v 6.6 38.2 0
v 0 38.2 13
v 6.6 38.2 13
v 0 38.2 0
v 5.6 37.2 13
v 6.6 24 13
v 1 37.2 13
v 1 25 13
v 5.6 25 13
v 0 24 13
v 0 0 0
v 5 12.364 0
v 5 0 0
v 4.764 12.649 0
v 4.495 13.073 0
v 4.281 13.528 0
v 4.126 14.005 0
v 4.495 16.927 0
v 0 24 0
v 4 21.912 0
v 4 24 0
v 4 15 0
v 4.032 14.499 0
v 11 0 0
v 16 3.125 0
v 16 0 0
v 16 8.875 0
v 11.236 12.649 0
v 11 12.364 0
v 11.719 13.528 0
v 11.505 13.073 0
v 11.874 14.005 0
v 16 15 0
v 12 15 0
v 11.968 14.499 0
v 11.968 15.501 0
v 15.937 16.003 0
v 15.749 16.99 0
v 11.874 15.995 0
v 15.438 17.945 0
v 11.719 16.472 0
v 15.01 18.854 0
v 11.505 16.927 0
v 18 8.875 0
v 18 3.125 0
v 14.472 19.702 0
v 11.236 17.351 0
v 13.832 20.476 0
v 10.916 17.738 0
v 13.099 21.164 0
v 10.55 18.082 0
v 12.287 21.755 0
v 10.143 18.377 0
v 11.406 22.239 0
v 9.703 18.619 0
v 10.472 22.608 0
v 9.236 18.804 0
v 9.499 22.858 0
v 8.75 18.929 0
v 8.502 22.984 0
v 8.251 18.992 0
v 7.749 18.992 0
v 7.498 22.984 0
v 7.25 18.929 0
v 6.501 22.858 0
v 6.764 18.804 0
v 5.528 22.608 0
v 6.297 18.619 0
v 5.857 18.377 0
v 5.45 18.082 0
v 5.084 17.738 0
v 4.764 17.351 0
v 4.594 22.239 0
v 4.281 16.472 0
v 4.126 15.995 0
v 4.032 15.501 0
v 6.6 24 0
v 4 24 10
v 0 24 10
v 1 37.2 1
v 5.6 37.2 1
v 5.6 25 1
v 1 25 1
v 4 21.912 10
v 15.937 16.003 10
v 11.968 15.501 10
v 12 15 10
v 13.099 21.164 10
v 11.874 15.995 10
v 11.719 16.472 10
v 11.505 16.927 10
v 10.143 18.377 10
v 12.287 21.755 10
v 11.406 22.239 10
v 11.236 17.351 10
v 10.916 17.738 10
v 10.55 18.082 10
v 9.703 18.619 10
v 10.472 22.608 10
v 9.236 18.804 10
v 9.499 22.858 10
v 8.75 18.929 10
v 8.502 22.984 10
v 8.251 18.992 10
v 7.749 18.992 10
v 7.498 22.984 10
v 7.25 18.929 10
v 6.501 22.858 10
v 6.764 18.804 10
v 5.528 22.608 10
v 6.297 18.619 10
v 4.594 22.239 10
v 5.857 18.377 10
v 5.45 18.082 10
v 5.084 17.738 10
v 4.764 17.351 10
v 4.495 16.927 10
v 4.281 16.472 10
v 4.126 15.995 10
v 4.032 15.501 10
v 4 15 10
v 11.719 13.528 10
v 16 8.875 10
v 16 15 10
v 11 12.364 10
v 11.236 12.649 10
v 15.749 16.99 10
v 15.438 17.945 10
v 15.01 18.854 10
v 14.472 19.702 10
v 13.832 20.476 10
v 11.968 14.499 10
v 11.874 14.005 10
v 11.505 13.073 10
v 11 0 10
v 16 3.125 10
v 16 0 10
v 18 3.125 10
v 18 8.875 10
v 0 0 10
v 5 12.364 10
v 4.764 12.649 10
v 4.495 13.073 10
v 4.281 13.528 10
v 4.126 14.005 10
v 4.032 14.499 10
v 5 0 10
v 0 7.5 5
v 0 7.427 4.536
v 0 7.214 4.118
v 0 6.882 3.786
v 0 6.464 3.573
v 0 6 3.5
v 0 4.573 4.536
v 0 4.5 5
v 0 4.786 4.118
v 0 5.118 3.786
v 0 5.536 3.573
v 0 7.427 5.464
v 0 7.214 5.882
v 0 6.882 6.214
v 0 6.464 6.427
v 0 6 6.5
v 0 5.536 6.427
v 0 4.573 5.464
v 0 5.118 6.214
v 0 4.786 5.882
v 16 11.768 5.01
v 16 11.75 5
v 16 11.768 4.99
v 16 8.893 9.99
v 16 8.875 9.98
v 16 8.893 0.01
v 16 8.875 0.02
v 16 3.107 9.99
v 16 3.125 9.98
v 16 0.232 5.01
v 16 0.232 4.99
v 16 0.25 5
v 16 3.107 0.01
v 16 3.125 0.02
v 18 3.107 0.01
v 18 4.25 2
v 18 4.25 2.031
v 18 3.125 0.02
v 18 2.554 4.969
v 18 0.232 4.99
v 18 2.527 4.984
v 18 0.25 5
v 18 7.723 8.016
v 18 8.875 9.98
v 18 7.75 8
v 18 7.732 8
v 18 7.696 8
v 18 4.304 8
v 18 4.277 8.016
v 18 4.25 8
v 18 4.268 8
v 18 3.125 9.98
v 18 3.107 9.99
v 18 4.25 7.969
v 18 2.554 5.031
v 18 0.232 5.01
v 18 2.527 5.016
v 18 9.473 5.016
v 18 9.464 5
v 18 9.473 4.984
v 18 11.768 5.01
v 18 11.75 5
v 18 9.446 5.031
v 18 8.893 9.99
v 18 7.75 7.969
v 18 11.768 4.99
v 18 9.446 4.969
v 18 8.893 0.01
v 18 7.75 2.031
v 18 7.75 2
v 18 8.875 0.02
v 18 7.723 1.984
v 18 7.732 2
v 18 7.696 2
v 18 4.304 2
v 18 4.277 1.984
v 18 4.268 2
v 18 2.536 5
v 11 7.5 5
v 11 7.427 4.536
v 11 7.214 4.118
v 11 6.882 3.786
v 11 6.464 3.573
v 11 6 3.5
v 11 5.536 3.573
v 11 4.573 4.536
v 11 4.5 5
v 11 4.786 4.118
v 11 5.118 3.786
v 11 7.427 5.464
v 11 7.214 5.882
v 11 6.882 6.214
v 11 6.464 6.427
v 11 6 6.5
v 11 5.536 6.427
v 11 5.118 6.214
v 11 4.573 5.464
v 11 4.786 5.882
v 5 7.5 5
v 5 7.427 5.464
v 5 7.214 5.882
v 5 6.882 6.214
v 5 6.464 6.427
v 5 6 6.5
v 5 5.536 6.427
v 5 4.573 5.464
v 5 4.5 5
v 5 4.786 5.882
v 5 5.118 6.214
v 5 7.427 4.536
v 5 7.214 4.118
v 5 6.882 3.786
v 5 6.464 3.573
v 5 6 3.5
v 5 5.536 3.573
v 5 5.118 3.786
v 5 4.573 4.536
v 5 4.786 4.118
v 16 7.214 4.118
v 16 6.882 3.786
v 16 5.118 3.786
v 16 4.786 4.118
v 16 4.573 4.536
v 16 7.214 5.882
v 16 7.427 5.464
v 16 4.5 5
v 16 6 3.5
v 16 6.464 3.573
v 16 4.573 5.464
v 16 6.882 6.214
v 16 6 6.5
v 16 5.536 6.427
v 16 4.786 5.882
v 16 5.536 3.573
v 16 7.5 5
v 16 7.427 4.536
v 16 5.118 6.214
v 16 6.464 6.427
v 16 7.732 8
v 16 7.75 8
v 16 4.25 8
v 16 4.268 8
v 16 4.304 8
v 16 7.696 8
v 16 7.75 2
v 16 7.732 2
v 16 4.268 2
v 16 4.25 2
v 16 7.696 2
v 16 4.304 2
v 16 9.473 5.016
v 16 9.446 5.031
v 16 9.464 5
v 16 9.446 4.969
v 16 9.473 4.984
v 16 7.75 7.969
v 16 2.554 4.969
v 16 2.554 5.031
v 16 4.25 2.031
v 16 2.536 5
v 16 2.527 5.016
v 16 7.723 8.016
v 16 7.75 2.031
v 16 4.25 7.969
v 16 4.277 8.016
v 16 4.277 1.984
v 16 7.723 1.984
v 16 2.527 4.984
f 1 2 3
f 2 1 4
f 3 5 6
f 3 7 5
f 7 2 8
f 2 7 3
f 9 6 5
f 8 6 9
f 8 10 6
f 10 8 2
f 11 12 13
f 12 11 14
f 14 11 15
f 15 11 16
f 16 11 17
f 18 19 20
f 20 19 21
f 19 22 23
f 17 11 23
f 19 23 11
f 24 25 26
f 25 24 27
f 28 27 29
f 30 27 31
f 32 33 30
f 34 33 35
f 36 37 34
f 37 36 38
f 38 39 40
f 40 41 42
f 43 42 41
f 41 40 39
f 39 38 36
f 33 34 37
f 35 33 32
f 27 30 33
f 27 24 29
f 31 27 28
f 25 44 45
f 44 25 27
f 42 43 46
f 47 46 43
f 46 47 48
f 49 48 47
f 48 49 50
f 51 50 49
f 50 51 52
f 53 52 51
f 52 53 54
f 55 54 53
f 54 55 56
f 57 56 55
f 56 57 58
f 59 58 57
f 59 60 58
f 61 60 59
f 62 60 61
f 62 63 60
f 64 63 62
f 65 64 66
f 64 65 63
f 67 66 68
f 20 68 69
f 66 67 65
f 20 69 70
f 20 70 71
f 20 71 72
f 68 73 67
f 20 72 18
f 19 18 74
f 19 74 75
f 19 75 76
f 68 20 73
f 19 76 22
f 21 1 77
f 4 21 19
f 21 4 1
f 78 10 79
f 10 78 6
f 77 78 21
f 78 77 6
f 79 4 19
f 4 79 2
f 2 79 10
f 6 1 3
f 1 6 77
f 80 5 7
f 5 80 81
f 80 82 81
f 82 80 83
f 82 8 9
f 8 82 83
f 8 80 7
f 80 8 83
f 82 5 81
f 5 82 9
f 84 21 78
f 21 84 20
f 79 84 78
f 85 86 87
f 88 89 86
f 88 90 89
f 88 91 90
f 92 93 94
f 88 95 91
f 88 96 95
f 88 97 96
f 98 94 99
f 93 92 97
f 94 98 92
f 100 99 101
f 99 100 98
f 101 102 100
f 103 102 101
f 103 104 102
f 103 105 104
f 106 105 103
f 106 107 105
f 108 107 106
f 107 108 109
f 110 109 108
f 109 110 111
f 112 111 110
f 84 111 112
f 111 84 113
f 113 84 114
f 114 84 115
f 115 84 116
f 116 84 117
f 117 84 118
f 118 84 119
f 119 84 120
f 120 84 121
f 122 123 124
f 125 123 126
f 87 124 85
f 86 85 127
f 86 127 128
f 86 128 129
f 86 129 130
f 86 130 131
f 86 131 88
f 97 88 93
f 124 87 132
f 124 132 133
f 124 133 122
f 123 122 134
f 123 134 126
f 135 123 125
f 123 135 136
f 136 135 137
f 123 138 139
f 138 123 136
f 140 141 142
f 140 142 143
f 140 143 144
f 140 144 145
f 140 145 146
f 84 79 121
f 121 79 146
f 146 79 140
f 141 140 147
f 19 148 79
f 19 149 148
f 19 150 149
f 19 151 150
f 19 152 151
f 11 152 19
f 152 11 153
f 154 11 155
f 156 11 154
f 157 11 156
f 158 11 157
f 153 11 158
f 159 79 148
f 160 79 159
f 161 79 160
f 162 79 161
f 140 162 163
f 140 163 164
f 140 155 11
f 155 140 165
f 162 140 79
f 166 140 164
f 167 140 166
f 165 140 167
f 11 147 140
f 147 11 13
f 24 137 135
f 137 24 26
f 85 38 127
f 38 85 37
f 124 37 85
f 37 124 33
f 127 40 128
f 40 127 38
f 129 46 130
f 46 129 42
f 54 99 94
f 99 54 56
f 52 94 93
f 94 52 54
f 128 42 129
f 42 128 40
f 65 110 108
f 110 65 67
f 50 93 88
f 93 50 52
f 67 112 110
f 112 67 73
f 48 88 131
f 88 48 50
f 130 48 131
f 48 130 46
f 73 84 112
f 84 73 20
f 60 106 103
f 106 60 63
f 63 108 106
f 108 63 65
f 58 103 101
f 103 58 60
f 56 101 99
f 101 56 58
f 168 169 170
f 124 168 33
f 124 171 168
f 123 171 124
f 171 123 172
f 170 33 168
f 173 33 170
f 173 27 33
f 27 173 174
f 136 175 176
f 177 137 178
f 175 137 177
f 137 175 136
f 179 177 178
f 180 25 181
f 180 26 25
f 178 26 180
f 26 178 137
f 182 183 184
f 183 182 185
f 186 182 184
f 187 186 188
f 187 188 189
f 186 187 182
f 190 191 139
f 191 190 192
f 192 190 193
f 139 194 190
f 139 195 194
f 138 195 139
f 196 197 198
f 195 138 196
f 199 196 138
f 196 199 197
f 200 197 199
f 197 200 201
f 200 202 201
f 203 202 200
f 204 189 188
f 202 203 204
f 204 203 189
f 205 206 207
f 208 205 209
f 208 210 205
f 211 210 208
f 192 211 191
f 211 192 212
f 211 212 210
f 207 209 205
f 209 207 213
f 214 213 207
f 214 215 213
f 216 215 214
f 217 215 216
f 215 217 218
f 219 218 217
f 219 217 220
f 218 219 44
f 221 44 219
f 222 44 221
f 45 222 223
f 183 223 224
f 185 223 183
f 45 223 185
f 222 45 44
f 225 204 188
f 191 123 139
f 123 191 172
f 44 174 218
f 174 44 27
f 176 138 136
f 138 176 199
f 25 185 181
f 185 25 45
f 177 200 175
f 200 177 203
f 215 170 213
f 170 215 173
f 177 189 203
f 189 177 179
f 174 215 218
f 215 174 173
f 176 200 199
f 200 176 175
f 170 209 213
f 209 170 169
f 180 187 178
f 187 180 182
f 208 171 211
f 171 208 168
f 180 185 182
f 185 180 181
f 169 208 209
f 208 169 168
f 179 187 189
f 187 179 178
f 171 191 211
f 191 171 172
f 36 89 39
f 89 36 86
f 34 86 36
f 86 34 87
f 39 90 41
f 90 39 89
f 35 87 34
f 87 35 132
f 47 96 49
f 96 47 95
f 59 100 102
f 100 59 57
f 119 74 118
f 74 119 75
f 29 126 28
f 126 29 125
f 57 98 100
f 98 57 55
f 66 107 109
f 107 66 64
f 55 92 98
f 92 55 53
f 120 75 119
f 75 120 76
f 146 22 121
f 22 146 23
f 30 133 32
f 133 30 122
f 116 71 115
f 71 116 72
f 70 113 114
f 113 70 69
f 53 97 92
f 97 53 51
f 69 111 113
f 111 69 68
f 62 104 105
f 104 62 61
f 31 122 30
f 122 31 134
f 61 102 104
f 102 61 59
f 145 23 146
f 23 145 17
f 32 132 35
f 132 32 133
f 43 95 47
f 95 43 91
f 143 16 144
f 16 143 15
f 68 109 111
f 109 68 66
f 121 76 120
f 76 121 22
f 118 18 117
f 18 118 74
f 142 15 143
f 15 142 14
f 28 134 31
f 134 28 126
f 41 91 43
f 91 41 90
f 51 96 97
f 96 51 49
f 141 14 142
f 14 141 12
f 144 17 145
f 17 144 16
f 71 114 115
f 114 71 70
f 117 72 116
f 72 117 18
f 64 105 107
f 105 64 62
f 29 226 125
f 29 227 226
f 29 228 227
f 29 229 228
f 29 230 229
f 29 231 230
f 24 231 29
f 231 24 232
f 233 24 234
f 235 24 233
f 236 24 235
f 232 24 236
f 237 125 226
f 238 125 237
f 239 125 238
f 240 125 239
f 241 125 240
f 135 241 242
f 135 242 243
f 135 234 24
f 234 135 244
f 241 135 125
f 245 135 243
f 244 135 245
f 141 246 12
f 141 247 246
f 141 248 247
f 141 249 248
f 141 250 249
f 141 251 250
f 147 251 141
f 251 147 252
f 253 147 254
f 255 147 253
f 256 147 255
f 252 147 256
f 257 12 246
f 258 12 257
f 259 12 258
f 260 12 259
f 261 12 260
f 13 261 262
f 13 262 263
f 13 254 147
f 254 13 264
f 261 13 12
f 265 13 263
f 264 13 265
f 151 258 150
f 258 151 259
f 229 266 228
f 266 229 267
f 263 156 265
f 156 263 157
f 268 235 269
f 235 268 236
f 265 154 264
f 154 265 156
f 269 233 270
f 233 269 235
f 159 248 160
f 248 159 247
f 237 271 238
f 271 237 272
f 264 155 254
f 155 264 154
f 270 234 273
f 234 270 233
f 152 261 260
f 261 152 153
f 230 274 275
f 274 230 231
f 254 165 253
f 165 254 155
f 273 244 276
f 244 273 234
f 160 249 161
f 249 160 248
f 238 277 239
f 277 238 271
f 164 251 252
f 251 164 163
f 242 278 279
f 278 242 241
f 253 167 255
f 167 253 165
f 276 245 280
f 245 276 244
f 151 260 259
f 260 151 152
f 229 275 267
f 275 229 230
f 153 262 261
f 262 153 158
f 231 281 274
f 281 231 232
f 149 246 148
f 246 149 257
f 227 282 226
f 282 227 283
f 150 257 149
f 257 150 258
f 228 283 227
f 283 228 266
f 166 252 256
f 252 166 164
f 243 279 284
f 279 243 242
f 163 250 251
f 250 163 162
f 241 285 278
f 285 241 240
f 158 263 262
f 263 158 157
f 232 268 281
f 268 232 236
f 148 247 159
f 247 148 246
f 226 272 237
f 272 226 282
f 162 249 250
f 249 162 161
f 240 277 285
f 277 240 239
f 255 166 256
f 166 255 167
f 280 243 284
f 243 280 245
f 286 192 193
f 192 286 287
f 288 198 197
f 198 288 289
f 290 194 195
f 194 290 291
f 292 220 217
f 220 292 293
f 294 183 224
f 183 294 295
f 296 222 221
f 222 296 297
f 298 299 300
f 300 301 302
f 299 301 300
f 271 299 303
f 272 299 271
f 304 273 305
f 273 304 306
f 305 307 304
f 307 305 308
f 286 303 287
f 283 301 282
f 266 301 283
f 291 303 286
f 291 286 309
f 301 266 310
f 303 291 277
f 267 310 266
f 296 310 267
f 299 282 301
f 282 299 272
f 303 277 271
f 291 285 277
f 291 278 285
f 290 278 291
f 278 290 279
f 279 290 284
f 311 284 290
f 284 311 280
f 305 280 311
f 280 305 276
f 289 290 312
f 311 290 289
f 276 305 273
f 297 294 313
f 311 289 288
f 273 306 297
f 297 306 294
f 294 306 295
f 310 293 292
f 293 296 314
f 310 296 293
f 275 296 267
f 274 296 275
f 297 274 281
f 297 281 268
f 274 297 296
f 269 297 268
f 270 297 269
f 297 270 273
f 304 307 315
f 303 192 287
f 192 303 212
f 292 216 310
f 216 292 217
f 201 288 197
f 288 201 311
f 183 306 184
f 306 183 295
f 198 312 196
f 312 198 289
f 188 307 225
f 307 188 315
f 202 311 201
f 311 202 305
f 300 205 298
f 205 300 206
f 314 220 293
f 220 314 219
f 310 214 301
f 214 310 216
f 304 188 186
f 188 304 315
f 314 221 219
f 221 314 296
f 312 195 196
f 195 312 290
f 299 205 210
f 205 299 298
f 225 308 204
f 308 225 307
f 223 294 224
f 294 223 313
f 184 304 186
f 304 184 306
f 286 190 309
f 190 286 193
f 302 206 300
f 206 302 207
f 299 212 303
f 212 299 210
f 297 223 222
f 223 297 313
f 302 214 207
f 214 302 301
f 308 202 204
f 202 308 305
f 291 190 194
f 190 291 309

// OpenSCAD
extra=0.1;
H=12;
L=4.5+extra;
B=12.1+extra;
union(){
rotate([0,0,90])
translate([24,-(L+2),0])
difference()
{

cube([B+2,L+2,H+1]);
translate([1,1,1])
cube([B,L,H+2]);
}

difference() {
	union() {
		cube([4,24,10]);  //4,45,10
		translate([8, 15,0]) cylinder(h = 10, r = 8, $fn = 50);
		cube([16, 15,10]);
		
		translate([17,6,5]) cube([2,5.75,10], center=true);
		translate([17,6,5]) rotate(a=[60,0,0]) cube([2,5.75,10], center=true);
		translate([17,6,5]) rotate(a=[120,0,0]) cube([2,5.75,10], center=true);

	}
	translate([8, 15,0]) cylinder(h = 10, r = 4, $fn = 50);
	translate([5, 0, 0]) cube([6, 15,10]);
	translate([-10, 6, 5]) rotate(a=[0, 90, 0]) cylinder(h = 30, r = 1.5, $fn= 20);

	translate([17,6,5]) cube([2,3.5,6], center=true);
	translate([17,6,5]) rotate(a=[60,0,0]) cube([2,3.5,6], center=true);
	translate([17,6,5]) rotate(a=[120,0,0]) cube([2,3.5,6], center=true);
}
}
